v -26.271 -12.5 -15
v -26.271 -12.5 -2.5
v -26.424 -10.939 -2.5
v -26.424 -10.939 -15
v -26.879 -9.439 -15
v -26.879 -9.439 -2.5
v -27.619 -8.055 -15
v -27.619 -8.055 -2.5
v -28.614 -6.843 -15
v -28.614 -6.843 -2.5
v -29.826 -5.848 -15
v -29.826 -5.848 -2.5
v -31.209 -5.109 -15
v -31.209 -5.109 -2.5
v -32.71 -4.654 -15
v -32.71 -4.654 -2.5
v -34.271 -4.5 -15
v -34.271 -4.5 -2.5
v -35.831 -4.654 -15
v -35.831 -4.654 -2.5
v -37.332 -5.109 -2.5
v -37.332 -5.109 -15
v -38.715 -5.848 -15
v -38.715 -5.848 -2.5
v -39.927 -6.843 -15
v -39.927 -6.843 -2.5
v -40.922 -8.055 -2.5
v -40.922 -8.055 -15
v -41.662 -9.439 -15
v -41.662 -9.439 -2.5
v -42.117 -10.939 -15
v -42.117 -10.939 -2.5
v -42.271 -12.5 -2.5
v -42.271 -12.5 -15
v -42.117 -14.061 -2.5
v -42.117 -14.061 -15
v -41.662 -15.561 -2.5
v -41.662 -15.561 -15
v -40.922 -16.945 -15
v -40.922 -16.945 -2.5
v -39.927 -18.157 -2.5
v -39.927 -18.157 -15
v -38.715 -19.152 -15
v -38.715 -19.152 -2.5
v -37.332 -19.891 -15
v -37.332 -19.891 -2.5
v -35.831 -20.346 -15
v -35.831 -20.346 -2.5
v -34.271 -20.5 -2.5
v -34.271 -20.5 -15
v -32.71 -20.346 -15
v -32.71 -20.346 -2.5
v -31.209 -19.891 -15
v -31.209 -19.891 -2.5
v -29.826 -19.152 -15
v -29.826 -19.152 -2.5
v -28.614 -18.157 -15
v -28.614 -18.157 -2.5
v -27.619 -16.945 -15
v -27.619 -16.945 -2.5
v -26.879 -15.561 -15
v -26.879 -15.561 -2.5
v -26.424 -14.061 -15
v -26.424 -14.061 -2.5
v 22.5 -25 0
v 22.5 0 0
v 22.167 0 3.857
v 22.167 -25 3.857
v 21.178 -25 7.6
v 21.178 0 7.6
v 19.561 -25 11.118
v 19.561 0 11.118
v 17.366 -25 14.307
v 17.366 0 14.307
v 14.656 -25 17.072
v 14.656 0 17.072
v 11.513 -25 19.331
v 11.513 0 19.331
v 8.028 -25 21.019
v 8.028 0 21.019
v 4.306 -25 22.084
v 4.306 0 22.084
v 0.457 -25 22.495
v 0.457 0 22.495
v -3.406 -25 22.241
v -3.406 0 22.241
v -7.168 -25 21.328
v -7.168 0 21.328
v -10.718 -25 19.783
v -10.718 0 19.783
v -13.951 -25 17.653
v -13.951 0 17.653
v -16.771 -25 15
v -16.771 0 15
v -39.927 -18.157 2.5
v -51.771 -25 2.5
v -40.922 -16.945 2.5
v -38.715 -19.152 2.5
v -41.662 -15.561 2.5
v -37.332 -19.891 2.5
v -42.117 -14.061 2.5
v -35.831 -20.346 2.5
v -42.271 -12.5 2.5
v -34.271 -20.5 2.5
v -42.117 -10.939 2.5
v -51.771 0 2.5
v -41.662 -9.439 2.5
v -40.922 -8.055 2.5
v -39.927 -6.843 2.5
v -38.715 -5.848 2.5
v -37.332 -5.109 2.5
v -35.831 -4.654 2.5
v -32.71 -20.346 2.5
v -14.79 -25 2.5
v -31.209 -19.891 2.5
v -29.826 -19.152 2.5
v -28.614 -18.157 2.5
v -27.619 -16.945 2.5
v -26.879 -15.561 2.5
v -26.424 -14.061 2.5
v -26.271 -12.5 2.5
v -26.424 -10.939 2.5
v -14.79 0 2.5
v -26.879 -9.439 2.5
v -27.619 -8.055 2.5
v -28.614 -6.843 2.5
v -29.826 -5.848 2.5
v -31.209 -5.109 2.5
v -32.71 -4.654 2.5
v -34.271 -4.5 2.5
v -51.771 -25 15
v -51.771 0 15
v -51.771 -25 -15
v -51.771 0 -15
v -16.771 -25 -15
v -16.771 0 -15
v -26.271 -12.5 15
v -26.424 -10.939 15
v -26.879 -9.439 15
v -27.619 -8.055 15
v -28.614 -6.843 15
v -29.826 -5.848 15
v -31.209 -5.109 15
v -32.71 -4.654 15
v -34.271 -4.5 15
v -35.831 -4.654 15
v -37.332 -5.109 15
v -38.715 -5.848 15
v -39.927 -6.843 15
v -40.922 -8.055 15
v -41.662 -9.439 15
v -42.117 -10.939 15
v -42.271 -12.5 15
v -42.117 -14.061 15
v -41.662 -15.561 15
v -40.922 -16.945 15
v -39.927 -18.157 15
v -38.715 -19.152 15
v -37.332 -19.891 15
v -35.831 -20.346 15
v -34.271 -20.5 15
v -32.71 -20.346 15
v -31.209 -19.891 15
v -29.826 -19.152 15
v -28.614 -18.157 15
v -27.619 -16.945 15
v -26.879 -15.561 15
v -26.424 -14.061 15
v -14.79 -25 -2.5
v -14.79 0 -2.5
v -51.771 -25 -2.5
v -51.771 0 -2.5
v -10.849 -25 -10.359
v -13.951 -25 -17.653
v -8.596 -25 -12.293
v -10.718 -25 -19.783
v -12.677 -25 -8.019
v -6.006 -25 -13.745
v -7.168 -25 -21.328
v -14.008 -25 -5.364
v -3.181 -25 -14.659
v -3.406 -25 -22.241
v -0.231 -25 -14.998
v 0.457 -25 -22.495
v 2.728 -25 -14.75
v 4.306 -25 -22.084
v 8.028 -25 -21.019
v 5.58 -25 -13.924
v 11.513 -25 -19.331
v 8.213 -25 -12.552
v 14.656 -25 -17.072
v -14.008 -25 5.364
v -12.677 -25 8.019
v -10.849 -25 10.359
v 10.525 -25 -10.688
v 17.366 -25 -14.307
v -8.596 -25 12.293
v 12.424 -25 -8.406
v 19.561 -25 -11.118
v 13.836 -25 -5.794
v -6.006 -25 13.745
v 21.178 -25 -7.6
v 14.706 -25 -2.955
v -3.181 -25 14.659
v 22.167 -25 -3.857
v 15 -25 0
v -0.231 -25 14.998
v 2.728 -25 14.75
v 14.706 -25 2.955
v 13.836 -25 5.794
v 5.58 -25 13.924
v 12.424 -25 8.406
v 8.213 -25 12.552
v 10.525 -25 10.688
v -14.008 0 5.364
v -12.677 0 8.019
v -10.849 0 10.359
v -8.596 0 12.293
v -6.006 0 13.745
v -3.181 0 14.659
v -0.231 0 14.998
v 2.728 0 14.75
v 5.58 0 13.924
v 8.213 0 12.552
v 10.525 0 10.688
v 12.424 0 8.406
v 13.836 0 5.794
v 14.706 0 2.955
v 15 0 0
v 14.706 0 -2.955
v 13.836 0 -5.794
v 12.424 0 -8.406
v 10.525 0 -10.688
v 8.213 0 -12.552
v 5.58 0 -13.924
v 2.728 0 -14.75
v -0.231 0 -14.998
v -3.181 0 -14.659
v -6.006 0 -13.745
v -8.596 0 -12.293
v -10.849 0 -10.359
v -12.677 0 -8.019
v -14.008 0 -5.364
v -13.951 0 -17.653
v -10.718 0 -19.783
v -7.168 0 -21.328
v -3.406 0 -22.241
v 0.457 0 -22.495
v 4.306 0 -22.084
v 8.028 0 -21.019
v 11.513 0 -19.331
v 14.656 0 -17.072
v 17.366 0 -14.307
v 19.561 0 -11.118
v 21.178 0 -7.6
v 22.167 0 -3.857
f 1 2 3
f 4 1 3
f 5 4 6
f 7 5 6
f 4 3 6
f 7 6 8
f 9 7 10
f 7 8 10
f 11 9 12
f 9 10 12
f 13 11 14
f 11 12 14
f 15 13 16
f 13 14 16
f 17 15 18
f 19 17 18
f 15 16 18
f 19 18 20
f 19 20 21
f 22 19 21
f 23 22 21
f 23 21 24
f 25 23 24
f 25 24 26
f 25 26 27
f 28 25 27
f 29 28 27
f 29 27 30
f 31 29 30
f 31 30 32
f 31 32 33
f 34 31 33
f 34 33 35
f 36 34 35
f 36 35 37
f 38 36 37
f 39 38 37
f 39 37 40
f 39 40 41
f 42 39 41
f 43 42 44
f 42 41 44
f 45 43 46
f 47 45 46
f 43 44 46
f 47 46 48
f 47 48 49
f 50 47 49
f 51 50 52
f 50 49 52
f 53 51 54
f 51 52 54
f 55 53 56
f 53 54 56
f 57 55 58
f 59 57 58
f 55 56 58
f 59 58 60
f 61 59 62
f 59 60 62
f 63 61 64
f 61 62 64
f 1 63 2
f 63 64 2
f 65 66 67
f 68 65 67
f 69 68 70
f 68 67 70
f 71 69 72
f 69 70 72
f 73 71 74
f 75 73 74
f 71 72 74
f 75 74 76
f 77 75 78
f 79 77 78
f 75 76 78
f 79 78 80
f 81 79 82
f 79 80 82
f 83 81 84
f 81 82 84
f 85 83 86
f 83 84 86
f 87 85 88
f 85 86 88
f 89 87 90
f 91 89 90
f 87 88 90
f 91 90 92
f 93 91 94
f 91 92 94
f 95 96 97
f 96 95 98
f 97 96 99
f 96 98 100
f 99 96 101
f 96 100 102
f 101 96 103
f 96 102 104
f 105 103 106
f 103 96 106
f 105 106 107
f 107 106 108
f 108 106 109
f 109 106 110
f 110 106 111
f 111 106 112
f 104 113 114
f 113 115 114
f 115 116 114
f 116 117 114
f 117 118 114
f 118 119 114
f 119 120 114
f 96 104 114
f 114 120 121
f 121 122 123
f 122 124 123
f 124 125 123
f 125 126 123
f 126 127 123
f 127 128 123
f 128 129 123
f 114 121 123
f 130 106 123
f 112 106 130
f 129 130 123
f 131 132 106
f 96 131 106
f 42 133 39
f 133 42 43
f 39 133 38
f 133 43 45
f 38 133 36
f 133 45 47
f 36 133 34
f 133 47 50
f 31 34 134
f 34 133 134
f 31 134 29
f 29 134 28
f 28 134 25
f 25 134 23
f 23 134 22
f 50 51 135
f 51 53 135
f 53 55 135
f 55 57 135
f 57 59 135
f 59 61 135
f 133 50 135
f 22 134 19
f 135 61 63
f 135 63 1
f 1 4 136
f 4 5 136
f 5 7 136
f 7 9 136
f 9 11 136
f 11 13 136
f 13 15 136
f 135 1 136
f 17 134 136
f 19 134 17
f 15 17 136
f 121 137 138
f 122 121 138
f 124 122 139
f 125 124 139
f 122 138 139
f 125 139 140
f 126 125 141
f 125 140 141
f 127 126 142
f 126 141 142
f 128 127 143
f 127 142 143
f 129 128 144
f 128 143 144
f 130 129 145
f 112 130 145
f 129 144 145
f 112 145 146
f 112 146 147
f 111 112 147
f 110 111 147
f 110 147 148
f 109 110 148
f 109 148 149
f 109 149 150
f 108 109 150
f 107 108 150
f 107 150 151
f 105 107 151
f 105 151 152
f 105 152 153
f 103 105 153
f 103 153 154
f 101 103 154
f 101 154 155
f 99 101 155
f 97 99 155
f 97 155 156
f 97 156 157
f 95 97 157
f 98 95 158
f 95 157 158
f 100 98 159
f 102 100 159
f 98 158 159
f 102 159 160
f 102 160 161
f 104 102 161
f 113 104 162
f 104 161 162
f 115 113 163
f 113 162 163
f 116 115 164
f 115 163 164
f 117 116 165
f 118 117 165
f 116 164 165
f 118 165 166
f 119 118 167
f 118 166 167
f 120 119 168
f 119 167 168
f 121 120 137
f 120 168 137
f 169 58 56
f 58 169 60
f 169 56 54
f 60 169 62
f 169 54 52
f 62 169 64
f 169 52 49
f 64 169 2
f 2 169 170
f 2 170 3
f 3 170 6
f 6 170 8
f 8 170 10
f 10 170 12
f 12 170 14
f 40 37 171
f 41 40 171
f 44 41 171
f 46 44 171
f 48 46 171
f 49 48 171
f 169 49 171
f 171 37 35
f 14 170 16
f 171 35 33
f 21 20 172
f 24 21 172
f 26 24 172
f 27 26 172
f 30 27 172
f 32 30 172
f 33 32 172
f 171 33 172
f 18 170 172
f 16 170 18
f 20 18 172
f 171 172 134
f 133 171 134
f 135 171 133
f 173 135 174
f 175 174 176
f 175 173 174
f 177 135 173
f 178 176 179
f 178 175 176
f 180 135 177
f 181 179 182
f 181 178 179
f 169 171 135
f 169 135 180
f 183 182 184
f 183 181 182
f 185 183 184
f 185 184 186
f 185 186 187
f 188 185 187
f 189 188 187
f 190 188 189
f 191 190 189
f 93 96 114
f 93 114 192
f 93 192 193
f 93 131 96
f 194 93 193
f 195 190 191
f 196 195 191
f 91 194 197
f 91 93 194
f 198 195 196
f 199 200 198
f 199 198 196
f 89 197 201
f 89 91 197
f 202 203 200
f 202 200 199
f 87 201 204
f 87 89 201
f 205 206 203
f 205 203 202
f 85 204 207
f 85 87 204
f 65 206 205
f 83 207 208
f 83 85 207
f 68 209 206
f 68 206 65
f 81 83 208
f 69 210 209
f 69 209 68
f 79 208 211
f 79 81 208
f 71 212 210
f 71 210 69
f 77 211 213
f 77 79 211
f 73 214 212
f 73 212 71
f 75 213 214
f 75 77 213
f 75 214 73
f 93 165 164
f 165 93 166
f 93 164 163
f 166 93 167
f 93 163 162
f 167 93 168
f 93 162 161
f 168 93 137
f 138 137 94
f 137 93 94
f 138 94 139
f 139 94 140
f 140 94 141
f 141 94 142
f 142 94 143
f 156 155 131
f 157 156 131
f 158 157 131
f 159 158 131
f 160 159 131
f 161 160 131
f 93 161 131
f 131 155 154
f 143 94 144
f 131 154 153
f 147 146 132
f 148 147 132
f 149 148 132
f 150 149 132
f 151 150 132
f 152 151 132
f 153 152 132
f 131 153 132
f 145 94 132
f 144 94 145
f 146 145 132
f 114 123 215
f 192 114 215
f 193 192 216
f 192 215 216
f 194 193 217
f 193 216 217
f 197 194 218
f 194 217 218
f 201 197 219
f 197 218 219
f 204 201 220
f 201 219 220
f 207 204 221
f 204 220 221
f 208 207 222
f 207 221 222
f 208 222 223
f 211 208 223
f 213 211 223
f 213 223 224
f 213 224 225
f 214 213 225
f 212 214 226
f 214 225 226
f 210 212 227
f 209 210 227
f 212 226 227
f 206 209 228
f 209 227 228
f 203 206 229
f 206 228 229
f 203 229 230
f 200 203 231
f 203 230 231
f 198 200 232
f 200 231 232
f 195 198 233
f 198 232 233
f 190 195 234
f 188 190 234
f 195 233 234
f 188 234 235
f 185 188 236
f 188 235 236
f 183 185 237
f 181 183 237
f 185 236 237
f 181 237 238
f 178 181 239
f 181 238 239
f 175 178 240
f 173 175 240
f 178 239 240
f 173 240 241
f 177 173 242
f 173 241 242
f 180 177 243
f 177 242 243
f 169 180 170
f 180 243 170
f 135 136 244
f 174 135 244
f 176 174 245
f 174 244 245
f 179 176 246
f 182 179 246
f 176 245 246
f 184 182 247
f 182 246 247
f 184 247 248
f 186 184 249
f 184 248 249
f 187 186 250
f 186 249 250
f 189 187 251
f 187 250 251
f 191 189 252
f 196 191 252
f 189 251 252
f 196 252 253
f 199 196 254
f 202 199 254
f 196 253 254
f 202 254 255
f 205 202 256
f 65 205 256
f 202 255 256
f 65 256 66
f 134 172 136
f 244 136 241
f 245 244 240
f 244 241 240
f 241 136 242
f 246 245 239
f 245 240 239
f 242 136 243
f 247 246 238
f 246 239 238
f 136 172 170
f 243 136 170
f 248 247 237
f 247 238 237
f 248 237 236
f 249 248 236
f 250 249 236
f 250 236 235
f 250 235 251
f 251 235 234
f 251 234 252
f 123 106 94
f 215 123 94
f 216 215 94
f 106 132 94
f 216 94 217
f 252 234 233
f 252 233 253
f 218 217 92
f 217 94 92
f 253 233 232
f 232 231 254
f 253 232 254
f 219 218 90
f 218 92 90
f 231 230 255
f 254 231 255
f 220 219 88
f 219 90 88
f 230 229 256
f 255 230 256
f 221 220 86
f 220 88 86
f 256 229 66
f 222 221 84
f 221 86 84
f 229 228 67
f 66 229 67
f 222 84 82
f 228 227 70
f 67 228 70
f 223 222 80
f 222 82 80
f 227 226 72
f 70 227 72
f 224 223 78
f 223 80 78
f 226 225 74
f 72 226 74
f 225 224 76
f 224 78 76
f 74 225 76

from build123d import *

# Parameters (mm, degrees)
F1_DEPTH = 25
F2_R     = 8
F3_DEPTH = 37.501


with BuildPart() as f1:
    # F0 (on Front) → F1 (new body)
    with BuildSketch(Plane.XZ):
        with BuildLine():
            Line((-51.7705098312, 2.5), (-22.360679775, 2.5))
            ThreePointArc((-22.360679775, 2.5), (-20.5395959064, 9.1855865354), (-16.7705098312, 15))
            Line((-16.7705098312, 15), (-51.7705098312, 15))
            Line((-51.7705098312, 15), (-51.7705098312, 2.5))
        make_face()
        with BuildLine():
            ThreePointArc((-16.7705098312, -15), (-20.5395959064, -9.1855865354), (-22.360679775, -2.5))
            Line((-22.360679775, -2.5), (-51.7705098312, -2.5))
            Line((-51.7705098312, -2.5), (-51.7705098312, -15))
            Line((-51.7705098312, -15), (-16.7705098312, -15))
        make_face()
        with BuildLine():
            ThreePointArc((-14.7901994577, 2.5), (1.2543939042, 14.9474578418), (15, 0))
            ThreePointArc((15, 0), (1.2543939042, -14.9474578418), (-14.7901994577, -2.5))
            Line((-14.7901994577, -2.5), (-22.360679775, -2.5))
            ThreePointArc((-22.360679775, -2.5), (-20.5395959064, -9.1855865354), (-16.7705098312, -15))
            ThreePointArc((-16.7705098312, -15), (8.0284970199, -21.0188780767), (22.5, 0))
            ThreePointArc((22.5, 0), (8.0284970199, 21.0188780767), (-16.7705098312, 15))
            ThreePointArc((-16.7705098312, 15), (-20.5395959064, 9.1855865354), (-22.360679775, 2.5))
            Line((-22.360679775, 2.5), (-14.7901994577, 2.5))
        make_face()
    extrude(amount=F1_DEPTH)

    # F2 (on face) → F3 (cut, through all)
    with BuildSketch(Plane.XY.offset(15)):
        with Locations((-34.2705098312, -12.5)):
            Circle(F2_R)
    extrude(amount=-F3_DEPTH, mode=Mode.SUBTRACT)


solid = f1.part
